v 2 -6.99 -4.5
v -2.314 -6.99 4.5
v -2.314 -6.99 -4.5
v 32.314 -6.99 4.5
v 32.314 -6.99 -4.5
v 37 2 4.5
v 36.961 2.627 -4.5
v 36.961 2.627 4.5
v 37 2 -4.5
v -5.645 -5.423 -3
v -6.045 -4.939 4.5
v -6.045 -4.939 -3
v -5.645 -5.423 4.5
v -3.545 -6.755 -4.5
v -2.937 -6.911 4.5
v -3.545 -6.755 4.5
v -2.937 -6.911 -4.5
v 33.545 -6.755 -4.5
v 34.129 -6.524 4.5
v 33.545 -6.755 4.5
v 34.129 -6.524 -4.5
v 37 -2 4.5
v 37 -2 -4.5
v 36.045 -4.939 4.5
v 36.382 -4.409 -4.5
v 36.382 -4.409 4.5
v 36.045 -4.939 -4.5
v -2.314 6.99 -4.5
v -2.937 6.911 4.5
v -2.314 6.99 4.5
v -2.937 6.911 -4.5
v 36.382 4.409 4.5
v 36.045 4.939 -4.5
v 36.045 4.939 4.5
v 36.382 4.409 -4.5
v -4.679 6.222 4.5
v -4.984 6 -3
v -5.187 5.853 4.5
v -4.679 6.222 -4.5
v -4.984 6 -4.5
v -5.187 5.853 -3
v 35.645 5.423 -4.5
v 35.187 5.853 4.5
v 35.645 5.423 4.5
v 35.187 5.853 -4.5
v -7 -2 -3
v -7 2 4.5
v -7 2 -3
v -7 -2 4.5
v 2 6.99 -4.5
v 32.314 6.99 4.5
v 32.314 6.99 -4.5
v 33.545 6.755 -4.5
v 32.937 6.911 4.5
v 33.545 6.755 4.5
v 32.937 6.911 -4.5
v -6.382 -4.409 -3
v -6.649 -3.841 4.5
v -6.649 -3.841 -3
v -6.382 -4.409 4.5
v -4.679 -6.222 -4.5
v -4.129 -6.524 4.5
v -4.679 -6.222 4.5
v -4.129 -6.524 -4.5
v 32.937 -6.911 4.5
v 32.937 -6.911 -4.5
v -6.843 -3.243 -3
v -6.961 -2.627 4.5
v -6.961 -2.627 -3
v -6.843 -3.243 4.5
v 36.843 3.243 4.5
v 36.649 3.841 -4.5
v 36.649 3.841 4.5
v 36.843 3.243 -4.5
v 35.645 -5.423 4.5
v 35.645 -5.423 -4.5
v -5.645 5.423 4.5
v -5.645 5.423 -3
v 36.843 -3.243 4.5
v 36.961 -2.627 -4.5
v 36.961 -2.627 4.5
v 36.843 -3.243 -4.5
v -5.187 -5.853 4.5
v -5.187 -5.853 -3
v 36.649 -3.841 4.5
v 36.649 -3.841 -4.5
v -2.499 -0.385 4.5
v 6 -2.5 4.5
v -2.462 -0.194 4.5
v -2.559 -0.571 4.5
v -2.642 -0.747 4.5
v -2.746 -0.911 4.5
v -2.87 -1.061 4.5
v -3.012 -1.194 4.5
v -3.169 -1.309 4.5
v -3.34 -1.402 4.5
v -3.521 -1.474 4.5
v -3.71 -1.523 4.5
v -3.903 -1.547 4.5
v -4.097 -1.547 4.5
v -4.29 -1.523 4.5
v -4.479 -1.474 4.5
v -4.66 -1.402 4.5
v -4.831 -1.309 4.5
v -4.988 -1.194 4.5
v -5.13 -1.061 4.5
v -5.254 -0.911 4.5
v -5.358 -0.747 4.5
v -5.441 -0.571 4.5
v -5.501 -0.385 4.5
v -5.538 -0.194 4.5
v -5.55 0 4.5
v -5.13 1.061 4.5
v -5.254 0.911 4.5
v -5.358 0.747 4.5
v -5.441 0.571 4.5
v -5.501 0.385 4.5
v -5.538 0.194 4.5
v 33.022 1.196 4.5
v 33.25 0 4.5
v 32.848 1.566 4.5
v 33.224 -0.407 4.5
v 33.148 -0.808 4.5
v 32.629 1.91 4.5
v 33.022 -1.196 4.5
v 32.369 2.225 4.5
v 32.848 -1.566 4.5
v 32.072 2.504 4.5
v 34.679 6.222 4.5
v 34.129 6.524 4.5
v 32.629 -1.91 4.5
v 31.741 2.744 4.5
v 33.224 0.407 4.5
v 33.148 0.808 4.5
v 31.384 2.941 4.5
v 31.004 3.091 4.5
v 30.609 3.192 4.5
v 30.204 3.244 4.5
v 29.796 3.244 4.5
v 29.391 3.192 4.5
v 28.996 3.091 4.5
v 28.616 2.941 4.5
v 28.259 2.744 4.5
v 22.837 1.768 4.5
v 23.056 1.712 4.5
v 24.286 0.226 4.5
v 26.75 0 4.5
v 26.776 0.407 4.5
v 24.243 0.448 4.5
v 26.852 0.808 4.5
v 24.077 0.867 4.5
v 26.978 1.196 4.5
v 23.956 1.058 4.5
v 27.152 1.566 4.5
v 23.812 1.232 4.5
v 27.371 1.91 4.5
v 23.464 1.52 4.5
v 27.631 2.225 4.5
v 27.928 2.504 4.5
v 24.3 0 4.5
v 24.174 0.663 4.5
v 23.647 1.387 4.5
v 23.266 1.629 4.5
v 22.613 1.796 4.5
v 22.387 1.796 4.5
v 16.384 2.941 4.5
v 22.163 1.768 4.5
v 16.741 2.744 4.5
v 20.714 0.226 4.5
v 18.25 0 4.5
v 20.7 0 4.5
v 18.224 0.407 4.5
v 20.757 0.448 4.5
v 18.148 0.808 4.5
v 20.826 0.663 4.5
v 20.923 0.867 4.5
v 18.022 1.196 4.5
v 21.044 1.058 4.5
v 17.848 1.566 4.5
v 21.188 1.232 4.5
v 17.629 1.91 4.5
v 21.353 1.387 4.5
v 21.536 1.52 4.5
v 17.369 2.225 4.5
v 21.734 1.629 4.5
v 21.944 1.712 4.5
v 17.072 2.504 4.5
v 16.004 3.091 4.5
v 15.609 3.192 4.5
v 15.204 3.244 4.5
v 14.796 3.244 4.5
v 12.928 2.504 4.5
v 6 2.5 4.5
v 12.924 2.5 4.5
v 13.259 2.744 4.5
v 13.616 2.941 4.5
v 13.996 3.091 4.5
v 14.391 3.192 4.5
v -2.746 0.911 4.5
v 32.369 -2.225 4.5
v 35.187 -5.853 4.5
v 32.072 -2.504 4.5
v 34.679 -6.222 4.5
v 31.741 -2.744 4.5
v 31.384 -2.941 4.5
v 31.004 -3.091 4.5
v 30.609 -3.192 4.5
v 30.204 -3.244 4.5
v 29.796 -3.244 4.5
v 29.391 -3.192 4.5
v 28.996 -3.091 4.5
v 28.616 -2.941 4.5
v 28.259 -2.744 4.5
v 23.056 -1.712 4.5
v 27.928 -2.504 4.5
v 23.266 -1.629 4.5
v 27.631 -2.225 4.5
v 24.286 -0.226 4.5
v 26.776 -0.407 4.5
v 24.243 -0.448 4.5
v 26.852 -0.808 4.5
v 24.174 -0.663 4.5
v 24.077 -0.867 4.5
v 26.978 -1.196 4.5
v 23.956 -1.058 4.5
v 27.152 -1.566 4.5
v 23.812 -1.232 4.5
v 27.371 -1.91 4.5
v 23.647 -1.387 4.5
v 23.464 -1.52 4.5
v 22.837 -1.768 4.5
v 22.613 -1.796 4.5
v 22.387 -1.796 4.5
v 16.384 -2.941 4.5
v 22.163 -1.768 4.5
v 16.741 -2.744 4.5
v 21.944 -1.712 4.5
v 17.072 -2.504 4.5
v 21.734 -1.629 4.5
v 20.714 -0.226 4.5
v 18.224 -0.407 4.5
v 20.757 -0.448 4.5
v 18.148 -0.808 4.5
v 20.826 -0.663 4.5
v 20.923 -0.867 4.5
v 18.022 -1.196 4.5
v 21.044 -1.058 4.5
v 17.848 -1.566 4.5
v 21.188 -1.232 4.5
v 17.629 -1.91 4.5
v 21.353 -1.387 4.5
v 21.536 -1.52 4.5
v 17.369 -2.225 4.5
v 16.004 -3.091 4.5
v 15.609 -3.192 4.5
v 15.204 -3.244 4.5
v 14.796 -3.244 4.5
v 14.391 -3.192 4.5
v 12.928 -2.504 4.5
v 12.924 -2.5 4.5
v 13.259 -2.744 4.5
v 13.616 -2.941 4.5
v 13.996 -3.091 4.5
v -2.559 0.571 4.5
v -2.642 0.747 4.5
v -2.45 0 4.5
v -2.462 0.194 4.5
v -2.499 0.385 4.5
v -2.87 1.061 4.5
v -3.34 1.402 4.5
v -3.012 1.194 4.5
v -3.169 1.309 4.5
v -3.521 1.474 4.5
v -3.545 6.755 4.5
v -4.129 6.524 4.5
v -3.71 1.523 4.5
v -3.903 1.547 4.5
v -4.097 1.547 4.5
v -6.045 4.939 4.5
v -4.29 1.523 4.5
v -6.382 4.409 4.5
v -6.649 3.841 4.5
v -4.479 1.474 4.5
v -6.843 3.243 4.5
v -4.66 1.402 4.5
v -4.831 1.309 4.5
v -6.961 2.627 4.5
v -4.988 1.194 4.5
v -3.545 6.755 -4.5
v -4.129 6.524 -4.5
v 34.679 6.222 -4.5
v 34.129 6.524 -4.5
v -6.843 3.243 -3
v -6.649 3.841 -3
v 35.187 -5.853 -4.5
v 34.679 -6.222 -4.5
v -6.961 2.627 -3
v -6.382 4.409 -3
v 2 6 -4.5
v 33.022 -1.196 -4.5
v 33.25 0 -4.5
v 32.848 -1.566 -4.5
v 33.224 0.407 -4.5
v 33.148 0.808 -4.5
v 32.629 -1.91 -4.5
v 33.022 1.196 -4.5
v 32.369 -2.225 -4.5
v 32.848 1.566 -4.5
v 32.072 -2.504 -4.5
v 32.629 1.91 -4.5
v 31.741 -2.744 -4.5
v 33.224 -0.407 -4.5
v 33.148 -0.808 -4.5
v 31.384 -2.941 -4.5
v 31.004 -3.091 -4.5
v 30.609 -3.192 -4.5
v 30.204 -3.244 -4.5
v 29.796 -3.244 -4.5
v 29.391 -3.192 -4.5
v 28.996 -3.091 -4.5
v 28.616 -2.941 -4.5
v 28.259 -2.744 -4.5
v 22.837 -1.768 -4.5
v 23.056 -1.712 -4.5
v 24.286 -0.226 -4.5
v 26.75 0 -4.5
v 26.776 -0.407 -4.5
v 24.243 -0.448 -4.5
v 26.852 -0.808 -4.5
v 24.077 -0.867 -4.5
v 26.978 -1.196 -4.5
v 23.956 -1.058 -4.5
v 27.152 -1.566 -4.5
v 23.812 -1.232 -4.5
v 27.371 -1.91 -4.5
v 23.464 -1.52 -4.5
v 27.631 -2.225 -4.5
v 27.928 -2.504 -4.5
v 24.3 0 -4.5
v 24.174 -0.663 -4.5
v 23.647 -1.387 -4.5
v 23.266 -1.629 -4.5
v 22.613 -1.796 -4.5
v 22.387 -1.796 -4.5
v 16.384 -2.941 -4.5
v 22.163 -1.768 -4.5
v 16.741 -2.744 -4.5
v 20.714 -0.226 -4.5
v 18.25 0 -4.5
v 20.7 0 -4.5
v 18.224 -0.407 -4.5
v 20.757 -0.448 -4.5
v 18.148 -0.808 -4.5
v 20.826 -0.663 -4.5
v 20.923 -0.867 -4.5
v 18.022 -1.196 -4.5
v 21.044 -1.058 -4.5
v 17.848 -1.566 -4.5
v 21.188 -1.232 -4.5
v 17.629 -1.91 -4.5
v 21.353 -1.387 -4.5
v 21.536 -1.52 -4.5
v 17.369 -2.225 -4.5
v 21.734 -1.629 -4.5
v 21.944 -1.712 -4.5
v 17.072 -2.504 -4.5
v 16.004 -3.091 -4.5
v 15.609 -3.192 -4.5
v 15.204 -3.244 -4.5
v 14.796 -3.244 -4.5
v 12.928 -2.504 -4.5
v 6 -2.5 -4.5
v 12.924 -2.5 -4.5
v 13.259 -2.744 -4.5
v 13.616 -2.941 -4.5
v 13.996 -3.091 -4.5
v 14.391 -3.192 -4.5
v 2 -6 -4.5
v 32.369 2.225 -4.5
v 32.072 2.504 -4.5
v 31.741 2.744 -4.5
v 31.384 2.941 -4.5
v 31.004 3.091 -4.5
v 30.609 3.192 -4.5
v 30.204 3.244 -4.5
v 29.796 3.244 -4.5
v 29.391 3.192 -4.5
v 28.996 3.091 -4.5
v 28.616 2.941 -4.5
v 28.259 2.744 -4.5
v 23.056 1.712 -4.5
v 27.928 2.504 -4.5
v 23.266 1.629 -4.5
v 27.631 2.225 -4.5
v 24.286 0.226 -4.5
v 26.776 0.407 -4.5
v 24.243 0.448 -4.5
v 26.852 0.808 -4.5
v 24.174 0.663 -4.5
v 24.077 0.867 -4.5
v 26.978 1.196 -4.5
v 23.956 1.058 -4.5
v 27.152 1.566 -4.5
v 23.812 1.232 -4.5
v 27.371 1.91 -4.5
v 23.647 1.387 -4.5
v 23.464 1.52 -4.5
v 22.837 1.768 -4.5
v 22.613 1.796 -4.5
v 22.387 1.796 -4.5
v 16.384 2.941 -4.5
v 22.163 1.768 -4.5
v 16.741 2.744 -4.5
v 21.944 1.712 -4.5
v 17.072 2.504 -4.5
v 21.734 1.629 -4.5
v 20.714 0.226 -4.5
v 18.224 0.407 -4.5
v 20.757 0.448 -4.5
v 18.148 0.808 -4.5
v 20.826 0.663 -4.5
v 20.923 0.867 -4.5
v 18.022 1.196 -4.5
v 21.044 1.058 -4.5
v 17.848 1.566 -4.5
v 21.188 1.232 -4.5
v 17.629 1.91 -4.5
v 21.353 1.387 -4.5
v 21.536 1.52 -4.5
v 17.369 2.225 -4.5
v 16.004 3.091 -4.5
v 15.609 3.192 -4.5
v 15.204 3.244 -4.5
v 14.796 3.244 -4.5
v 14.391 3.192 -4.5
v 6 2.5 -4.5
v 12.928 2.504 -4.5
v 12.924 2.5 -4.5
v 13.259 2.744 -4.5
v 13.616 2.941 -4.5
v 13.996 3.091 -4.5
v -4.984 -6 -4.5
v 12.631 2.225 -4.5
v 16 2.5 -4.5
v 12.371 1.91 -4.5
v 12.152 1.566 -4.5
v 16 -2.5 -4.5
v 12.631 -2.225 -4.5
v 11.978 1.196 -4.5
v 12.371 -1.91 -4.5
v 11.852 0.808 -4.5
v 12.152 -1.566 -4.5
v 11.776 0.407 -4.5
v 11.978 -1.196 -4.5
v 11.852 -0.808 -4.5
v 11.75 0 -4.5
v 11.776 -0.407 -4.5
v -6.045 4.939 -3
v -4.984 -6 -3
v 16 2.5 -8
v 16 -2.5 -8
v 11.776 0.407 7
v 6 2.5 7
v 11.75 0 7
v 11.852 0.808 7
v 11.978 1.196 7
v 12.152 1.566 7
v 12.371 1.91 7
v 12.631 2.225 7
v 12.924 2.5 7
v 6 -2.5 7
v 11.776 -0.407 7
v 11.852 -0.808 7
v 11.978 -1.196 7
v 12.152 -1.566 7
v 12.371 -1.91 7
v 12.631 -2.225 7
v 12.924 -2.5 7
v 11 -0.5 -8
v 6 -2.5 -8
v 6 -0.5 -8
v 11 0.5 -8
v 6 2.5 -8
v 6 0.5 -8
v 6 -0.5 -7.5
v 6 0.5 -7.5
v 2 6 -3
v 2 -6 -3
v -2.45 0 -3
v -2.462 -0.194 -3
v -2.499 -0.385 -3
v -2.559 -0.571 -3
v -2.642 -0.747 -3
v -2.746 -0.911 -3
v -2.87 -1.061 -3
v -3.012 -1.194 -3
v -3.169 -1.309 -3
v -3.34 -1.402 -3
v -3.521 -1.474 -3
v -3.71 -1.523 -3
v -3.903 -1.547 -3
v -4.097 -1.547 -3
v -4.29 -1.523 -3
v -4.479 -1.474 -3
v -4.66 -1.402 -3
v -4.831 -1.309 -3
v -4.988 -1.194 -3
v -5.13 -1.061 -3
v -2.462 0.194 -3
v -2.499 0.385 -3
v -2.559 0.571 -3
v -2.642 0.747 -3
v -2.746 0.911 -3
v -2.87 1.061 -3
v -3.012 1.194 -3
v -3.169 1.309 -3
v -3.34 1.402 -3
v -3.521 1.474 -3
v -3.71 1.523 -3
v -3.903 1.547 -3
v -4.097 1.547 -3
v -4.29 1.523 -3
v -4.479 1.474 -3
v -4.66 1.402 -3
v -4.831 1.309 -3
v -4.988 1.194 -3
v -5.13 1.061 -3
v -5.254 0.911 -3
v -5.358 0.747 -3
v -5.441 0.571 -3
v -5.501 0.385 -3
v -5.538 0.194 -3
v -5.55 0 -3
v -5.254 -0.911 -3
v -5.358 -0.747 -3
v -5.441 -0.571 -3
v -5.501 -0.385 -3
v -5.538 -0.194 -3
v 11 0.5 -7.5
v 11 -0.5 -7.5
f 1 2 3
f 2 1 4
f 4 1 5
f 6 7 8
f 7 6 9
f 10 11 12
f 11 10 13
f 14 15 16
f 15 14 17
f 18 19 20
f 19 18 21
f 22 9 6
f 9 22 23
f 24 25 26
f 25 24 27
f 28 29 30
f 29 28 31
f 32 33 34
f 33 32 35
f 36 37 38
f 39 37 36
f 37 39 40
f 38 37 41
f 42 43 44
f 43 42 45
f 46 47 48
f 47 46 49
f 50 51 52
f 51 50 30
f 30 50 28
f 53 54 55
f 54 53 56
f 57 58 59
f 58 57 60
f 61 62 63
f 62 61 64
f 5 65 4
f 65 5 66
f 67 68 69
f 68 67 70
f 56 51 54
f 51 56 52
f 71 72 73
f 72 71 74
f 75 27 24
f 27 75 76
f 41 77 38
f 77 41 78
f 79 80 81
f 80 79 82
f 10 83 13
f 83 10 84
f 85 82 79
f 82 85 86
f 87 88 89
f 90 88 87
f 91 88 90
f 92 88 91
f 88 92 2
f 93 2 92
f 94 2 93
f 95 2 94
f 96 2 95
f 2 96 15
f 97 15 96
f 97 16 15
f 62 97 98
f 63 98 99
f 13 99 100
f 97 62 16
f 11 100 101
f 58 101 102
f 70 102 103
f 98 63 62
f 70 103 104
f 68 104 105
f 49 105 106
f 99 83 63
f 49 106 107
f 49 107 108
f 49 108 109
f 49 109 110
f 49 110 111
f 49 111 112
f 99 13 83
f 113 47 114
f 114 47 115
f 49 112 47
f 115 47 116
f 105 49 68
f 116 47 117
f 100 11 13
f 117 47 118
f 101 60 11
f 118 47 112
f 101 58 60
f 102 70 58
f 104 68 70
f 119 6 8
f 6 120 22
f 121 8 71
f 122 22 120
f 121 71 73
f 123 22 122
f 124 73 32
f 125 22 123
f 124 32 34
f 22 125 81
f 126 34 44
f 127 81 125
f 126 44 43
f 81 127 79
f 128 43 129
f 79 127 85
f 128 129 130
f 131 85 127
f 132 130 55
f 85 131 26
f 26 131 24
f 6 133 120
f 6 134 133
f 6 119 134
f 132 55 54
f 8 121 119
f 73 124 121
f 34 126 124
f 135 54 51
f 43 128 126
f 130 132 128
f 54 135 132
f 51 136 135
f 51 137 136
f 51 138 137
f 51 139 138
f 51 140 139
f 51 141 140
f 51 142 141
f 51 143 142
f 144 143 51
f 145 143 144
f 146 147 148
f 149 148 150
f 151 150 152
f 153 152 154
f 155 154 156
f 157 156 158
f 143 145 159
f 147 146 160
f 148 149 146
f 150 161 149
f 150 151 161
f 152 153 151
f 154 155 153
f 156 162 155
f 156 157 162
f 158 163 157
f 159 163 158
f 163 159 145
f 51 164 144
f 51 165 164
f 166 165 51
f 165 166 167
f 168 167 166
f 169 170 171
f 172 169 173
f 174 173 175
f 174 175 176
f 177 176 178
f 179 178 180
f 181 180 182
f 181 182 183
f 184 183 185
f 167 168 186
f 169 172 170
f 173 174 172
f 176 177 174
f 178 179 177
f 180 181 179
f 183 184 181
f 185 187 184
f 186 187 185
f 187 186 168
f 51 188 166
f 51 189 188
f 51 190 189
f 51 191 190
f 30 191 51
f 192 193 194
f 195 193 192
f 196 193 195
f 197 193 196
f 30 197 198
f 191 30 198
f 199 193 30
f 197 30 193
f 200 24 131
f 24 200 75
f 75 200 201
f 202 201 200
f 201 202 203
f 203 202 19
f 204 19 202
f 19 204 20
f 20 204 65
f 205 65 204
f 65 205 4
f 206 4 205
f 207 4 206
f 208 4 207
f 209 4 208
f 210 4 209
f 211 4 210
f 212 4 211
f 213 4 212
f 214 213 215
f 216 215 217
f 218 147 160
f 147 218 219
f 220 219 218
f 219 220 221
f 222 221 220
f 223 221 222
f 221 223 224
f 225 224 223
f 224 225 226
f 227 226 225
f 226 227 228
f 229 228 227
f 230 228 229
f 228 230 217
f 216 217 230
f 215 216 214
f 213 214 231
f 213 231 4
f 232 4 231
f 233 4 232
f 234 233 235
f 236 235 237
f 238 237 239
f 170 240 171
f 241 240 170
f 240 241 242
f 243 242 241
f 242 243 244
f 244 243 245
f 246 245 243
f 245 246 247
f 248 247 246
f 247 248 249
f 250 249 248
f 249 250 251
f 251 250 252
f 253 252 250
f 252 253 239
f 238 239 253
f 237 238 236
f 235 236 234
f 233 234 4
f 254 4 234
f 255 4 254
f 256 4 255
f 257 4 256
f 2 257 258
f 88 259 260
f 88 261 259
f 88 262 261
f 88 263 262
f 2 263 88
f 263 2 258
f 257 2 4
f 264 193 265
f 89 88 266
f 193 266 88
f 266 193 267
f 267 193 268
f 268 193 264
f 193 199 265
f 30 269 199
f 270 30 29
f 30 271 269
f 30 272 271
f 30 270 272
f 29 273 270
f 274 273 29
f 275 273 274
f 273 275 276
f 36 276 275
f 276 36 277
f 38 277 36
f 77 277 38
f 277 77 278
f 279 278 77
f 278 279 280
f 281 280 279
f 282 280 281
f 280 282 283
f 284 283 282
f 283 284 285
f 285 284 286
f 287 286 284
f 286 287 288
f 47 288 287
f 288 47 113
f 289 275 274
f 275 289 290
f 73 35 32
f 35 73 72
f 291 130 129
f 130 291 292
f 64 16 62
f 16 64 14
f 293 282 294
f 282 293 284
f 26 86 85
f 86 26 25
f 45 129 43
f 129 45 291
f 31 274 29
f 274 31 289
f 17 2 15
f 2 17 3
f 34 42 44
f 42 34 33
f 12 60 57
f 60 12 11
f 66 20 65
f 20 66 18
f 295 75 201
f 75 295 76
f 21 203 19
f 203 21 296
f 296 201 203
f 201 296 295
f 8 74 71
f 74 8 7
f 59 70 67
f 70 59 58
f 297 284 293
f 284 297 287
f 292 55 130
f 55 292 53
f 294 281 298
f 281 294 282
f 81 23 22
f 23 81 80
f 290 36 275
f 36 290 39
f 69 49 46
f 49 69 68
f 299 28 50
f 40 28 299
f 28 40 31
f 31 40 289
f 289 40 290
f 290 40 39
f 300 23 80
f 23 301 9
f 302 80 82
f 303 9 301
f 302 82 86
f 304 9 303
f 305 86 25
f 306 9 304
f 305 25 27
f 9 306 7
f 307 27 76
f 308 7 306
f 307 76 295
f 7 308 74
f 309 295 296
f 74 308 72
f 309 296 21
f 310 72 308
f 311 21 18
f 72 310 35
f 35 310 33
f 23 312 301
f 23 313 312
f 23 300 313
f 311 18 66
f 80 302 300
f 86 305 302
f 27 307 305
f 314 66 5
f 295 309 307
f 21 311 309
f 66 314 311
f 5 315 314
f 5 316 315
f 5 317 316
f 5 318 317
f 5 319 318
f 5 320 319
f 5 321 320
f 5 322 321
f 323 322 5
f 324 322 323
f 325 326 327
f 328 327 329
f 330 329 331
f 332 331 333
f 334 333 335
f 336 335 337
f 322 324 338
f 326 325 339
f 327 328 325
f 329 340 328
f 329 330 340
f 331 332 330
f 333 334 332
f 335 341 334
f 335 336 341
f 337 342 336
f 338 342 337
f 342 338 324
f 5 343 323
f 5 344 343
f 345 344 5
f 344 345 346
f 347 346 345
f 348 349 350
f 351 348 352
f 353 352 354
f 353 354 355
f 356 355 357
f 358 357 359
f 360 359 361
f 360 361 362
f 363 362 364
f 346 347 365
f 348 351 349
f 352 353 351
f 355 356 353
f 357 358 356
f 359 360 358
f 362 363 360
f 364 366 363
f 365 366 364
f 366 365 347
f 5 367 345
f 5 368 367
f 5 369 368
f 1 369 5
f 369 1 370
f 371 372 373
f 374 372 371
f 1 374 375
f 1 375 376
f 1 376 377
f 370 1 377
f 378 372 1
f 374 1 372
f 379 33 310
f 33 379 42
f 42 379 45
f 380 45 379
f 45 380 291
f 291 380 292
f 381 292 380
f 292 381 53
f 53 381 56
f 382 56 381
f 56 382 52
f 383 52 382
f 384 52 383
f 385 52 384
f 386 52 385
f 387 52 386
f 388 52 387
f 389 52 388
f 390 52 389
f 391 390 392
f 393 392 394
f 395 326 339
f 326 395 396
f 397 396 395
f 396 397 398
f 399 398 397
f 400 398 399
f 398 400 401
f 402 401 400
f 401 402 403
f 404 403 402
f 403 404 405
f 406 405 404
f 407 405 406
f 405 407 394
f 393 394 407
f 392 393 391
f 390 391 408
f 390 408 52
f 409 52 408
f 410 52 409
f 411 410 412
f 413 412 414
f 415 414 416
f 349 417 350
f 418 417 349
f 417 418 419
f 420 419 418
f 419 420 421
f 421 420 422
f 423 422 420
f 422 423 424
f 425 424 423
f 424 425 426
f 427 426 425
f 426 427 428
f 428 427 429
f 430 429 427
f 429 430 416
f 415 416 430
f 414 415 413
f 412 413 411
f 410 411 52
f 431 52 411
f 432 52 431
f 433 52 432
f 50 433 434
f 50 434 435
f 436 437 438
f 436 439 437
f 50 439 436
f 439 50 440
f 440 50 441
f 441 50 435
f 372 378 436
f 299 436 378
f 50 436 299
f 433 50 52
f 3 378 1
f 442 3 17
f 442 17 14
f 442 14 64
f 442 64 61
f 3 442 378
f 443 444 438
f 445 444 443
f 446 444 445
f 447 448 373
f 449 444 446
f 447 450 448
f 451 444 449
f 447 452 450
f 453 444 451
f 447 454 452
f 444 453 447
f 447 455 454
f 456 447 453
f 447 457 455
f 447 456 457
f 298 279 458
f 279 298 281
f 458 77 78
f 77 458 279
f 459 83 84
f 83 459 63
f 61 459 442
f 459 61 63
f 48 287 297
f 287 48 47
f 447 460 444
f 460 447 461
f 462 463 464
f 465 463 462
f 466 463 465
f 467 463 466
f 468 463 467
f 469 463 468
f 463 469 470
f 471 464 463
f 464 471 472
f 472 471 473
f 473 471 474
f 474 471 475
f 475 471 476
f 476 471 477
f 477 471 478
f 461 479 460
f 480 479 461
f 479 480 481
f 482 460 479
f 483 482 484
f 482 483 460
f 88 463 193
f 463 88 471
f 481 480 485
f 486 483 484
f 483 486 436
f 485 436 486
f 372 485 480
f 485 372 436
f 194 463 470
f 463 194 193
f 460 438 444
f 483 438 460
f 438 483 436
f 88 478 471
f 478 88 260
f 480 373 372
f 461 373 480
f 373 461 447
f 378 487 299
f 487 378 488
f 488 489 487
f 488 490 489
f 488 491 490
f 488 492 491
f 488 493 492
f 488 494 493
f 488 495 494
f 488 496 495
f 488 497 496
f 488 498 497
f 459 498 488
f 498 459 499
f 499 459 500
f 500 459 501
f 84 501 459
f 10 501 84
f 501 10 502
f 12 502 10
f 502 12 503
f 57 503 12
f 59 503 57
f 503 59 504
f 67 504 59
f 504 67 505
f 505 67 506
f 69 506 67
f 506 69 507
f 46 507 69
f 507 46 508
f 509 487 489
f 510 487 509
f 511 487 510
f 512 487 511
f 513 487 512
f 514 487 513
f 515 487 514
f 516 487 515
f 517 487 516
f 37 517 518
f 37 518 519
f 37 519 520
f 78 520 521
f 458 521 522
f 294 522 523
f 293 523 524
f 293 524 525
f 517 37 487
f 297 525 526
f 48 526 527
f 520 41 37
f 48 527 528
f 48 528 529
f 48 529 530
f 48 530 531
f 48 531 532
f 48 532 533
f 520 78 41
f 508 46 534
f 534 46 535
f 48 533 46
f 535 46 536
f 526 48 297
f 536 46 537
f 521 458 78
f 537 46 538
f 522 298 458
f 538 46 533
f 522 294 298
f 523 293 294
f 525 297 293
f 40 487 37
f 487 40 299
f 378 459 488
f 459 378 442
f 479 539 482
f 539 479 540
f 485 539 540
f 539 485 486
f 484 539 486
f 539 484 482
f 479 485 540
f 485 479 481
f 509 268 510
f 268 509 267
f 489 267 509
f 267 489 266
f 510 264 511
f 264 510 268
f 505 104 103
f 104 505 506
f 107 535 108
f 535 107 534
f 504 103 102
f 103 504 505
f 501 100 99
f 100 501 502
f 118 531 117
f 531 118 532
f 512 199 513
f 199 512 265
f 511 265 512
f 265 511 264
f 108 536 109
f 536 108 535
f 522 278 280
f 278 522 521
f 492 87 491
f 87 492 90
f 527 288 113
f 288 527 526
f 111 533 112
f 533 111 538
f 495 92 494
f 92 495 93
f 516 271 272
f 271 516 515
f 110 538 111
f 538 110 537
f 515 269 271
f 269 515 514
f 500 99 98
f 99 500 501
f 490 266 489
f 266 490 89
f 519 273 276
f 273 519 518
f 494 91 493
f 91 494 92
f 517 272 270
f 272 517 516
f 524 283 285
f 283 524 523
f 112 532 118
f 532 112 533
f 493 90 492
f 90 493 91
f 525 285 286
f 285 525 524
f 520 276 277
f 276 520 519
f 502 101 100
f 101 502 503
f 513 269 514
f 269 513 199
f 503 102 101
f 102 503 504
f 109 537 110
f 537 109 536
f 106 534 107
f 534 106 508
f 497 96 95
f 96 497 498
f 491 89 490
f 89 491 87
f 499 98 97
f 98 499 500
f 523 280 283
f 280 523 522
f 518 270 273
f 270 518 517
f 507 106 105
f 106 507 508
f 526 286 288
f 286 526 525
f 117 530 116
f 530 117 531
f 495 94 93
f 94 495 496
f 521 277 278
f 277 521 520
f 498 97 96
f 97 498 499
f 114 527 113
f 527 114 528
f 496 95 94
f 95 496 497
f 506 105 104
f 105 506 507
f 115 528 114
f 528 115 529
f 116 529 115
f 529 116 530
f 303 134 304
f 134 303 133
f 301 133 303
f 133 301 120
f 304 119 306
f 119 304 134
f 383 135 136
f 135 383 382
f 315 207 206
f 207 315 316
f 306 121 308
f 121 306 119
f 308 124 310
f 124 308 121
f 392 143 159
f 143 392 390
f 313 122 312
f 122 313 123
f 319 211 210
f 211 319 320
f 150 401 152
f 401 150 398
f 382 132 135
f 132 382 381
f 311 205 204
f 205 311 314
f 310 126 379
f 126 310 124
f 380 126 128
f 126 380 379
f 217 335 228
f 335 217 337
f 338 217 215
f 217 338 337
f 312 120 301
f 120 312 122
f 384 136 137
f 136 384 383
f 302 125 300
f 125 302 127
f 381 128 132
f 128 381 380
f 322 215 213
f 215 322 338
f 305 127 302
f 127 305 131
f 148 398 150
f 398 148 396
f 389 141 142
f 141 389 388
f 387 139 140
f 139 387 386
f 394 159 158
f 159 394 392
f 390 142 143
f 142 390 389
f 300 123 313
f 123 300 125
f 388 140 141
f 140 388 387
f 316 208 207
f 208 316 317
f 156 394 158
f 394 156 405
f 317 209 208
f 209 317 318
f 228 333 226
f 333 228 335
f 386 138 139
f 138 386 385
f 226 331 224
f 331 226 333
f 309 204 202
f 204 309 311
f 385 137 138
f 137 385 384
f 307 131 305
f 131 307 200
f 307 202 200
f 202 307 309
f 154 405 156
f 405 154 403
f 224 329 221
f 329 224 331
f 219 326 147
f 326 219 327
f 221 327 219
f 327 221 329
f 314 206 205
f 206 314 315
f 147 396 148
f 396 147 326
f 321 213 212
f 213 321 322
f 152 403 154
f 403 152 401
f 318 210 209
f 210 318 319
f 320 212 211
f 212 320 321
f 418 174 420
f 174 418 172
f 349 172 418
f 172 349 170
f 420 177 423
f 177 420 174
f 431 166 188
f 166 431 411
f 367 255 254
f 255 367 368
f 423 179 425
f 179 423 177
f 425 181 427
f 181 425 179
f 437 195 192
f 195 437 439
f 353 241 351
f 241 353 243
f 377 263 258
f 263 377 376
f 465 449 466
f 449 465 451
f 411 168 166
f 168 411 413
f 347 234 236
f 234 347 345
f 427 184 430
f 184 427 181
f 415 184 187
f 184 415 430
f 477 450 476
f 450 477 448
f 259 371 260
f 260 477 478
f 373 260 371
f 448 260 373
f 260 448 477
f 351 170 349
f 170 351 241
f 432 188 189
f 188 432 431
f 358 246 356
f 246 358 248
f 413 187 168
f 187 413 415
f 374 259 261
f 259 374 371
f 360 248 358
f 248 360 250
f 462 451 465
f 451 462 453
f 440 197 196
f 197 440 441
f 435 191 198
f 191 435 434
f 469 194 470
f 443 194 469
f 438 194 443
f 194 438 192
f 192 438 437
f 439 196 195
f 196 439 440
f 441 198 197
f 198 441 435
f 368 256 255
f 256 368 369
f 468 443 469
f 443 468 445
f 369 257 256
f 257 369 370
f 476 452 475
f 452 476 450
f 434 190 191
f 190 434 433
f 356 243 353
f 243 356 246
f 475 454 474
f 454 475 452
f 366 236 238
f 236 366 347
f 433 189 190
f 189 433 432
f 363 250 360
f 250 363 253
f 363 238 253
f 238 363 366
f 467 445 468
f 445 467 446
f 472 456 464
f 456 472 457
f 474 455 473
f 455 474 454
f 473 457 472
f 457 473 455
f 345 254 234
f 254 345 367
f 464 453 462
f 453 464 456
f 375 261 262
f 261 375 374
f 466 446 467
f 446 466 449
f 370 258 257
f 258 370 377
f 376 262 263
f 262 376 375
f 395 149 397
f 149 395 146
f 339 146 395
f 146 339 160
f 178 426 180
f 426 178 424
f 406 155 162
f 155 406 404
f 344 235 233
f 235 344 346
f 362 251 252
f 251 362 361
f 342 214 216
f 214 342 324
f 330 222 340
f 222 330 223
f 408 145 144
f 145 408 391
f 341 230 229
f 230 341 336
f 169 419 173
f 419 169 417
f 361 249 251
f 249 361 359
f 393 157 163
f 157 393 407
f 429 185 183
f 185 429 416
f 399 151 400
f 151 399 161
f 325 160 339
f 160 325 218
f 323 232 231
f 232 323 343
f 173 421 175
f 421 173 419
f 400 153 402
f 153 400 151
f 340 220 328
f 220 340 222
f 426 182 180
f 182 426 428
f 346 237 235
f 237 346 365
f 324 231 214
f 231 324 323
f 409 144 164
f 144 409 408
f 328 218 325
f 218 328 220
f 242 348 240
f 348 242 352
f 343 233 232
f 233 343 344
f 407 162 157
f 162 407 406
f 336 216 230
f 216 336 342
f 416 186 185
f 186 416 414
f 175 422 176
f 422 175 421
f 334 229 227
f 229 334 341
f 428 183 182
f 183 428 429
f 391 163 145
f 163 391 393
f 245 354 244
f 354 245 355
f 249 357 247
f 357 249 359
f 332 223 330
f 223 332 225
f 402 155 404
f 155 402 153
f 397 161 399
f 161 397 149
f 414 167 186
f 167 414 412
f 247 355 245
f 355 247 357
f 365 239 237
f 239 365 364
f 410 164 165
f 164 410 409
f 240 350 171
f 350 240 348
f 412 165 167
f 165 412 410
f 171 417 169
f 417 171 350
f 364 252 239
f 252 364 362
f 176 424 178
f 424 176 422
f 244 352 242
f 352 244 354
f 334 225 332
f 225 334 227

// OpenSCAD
$fn = 50;


difference() {
	union() {
		translate(v = [15.0000000000, 0, -4.5000000000]) {
			hull() {
				translate(v = [-17.0000000000, 2.0000000000, 0]) {
					cylinder(h = 9, r = 5);
				}
				translate(v = [17.0000000000, 2.0000000000, 0]) {
					cylinder(h = 9, r = 5);
				}
				translate(v = [-17.0000000000, -2.0000000000, 0]) {
					cylinder(h = 9, r = 5);
				}
				translate(v = [17.0000000000, -2.0000000000, 0]) {
					cylinder(h = 9, r = 5);
				}
			}
		}
		translate(v = [6.0000000000, -2.5000000000, -8]) {
			cube(size = [10, 5, 15]);
		}
	}
	union() {
		translate(v = [-10, 0, -12.5000000000]) {
			rotate(a = [0, 90, 0]) {
				difference() {
					union() {
						translate(v = [-8.0000000000, -8.0000000000, 0]) {
							cube(size = [16, 16, 12]);
						}
						translate(v = [5.2500000000, 6.7500000000, -4]) {
							cube(size = [3, 1.5000000000, 4]);
						}
						translate(v = [-8.2500000000, 6.7500000000, -4]) {
							cube(size = [3, 1.5000000000, 4]);
						}
						translate(v = [5.2500000000, -8.2500000000, -4]) {
							cube(size = [3, 1.5000000000, 4]);
						}
						translate(v = [-8.2500000000, -8.2500000000, -4]) {
							cube(size = [3, 1.5000000000, 4]);
						}
						translate(v = [4.5000000000, -9.5000000000, 0]) {
							cube(size = [2, 19, 3.5000000000]);
						}
						translate(v = [-6.5000000000, -9.5000000000, 0]) {
							cube(size = [2, 19, 3.5000000000]);
						}
						translate(v = [8.0000000000, -6.0000000000, -4]) {
							cube(size = [4, 12, 16]);
						}
						translate(v = [-9.5000000000, -6.0000000000, -4]) {
							cube(size = [1.5000000000, 12, 16]);
						}
						translate(v = [-5.0000000000, -0.5000000000, 12]) {
							cube(size = [10, 1, 9]);
						}
					}
					union();
				}
			}
		}
		translate(v = [-4, 0, -100.0000000000]) {
			cylinder(h = 200, r = 1.5500000000);
		}
		translate(v = [30.0000000000, 0.0000000000, -4.5000000000]) {
			cylinder(h = 100, r = 3.2500000000);
		}
		translate(v = [15.0000000000, 0.0000000000, -4.5000000000]) {
			cylinder(h = 100, r = 3.2500000000);
		}
		translate(v = [22.5000000000, 0.0000000000, -4.5000000000]) {
			cylinder(h = 100, r = 1.8000000000);
		}
	}
}
